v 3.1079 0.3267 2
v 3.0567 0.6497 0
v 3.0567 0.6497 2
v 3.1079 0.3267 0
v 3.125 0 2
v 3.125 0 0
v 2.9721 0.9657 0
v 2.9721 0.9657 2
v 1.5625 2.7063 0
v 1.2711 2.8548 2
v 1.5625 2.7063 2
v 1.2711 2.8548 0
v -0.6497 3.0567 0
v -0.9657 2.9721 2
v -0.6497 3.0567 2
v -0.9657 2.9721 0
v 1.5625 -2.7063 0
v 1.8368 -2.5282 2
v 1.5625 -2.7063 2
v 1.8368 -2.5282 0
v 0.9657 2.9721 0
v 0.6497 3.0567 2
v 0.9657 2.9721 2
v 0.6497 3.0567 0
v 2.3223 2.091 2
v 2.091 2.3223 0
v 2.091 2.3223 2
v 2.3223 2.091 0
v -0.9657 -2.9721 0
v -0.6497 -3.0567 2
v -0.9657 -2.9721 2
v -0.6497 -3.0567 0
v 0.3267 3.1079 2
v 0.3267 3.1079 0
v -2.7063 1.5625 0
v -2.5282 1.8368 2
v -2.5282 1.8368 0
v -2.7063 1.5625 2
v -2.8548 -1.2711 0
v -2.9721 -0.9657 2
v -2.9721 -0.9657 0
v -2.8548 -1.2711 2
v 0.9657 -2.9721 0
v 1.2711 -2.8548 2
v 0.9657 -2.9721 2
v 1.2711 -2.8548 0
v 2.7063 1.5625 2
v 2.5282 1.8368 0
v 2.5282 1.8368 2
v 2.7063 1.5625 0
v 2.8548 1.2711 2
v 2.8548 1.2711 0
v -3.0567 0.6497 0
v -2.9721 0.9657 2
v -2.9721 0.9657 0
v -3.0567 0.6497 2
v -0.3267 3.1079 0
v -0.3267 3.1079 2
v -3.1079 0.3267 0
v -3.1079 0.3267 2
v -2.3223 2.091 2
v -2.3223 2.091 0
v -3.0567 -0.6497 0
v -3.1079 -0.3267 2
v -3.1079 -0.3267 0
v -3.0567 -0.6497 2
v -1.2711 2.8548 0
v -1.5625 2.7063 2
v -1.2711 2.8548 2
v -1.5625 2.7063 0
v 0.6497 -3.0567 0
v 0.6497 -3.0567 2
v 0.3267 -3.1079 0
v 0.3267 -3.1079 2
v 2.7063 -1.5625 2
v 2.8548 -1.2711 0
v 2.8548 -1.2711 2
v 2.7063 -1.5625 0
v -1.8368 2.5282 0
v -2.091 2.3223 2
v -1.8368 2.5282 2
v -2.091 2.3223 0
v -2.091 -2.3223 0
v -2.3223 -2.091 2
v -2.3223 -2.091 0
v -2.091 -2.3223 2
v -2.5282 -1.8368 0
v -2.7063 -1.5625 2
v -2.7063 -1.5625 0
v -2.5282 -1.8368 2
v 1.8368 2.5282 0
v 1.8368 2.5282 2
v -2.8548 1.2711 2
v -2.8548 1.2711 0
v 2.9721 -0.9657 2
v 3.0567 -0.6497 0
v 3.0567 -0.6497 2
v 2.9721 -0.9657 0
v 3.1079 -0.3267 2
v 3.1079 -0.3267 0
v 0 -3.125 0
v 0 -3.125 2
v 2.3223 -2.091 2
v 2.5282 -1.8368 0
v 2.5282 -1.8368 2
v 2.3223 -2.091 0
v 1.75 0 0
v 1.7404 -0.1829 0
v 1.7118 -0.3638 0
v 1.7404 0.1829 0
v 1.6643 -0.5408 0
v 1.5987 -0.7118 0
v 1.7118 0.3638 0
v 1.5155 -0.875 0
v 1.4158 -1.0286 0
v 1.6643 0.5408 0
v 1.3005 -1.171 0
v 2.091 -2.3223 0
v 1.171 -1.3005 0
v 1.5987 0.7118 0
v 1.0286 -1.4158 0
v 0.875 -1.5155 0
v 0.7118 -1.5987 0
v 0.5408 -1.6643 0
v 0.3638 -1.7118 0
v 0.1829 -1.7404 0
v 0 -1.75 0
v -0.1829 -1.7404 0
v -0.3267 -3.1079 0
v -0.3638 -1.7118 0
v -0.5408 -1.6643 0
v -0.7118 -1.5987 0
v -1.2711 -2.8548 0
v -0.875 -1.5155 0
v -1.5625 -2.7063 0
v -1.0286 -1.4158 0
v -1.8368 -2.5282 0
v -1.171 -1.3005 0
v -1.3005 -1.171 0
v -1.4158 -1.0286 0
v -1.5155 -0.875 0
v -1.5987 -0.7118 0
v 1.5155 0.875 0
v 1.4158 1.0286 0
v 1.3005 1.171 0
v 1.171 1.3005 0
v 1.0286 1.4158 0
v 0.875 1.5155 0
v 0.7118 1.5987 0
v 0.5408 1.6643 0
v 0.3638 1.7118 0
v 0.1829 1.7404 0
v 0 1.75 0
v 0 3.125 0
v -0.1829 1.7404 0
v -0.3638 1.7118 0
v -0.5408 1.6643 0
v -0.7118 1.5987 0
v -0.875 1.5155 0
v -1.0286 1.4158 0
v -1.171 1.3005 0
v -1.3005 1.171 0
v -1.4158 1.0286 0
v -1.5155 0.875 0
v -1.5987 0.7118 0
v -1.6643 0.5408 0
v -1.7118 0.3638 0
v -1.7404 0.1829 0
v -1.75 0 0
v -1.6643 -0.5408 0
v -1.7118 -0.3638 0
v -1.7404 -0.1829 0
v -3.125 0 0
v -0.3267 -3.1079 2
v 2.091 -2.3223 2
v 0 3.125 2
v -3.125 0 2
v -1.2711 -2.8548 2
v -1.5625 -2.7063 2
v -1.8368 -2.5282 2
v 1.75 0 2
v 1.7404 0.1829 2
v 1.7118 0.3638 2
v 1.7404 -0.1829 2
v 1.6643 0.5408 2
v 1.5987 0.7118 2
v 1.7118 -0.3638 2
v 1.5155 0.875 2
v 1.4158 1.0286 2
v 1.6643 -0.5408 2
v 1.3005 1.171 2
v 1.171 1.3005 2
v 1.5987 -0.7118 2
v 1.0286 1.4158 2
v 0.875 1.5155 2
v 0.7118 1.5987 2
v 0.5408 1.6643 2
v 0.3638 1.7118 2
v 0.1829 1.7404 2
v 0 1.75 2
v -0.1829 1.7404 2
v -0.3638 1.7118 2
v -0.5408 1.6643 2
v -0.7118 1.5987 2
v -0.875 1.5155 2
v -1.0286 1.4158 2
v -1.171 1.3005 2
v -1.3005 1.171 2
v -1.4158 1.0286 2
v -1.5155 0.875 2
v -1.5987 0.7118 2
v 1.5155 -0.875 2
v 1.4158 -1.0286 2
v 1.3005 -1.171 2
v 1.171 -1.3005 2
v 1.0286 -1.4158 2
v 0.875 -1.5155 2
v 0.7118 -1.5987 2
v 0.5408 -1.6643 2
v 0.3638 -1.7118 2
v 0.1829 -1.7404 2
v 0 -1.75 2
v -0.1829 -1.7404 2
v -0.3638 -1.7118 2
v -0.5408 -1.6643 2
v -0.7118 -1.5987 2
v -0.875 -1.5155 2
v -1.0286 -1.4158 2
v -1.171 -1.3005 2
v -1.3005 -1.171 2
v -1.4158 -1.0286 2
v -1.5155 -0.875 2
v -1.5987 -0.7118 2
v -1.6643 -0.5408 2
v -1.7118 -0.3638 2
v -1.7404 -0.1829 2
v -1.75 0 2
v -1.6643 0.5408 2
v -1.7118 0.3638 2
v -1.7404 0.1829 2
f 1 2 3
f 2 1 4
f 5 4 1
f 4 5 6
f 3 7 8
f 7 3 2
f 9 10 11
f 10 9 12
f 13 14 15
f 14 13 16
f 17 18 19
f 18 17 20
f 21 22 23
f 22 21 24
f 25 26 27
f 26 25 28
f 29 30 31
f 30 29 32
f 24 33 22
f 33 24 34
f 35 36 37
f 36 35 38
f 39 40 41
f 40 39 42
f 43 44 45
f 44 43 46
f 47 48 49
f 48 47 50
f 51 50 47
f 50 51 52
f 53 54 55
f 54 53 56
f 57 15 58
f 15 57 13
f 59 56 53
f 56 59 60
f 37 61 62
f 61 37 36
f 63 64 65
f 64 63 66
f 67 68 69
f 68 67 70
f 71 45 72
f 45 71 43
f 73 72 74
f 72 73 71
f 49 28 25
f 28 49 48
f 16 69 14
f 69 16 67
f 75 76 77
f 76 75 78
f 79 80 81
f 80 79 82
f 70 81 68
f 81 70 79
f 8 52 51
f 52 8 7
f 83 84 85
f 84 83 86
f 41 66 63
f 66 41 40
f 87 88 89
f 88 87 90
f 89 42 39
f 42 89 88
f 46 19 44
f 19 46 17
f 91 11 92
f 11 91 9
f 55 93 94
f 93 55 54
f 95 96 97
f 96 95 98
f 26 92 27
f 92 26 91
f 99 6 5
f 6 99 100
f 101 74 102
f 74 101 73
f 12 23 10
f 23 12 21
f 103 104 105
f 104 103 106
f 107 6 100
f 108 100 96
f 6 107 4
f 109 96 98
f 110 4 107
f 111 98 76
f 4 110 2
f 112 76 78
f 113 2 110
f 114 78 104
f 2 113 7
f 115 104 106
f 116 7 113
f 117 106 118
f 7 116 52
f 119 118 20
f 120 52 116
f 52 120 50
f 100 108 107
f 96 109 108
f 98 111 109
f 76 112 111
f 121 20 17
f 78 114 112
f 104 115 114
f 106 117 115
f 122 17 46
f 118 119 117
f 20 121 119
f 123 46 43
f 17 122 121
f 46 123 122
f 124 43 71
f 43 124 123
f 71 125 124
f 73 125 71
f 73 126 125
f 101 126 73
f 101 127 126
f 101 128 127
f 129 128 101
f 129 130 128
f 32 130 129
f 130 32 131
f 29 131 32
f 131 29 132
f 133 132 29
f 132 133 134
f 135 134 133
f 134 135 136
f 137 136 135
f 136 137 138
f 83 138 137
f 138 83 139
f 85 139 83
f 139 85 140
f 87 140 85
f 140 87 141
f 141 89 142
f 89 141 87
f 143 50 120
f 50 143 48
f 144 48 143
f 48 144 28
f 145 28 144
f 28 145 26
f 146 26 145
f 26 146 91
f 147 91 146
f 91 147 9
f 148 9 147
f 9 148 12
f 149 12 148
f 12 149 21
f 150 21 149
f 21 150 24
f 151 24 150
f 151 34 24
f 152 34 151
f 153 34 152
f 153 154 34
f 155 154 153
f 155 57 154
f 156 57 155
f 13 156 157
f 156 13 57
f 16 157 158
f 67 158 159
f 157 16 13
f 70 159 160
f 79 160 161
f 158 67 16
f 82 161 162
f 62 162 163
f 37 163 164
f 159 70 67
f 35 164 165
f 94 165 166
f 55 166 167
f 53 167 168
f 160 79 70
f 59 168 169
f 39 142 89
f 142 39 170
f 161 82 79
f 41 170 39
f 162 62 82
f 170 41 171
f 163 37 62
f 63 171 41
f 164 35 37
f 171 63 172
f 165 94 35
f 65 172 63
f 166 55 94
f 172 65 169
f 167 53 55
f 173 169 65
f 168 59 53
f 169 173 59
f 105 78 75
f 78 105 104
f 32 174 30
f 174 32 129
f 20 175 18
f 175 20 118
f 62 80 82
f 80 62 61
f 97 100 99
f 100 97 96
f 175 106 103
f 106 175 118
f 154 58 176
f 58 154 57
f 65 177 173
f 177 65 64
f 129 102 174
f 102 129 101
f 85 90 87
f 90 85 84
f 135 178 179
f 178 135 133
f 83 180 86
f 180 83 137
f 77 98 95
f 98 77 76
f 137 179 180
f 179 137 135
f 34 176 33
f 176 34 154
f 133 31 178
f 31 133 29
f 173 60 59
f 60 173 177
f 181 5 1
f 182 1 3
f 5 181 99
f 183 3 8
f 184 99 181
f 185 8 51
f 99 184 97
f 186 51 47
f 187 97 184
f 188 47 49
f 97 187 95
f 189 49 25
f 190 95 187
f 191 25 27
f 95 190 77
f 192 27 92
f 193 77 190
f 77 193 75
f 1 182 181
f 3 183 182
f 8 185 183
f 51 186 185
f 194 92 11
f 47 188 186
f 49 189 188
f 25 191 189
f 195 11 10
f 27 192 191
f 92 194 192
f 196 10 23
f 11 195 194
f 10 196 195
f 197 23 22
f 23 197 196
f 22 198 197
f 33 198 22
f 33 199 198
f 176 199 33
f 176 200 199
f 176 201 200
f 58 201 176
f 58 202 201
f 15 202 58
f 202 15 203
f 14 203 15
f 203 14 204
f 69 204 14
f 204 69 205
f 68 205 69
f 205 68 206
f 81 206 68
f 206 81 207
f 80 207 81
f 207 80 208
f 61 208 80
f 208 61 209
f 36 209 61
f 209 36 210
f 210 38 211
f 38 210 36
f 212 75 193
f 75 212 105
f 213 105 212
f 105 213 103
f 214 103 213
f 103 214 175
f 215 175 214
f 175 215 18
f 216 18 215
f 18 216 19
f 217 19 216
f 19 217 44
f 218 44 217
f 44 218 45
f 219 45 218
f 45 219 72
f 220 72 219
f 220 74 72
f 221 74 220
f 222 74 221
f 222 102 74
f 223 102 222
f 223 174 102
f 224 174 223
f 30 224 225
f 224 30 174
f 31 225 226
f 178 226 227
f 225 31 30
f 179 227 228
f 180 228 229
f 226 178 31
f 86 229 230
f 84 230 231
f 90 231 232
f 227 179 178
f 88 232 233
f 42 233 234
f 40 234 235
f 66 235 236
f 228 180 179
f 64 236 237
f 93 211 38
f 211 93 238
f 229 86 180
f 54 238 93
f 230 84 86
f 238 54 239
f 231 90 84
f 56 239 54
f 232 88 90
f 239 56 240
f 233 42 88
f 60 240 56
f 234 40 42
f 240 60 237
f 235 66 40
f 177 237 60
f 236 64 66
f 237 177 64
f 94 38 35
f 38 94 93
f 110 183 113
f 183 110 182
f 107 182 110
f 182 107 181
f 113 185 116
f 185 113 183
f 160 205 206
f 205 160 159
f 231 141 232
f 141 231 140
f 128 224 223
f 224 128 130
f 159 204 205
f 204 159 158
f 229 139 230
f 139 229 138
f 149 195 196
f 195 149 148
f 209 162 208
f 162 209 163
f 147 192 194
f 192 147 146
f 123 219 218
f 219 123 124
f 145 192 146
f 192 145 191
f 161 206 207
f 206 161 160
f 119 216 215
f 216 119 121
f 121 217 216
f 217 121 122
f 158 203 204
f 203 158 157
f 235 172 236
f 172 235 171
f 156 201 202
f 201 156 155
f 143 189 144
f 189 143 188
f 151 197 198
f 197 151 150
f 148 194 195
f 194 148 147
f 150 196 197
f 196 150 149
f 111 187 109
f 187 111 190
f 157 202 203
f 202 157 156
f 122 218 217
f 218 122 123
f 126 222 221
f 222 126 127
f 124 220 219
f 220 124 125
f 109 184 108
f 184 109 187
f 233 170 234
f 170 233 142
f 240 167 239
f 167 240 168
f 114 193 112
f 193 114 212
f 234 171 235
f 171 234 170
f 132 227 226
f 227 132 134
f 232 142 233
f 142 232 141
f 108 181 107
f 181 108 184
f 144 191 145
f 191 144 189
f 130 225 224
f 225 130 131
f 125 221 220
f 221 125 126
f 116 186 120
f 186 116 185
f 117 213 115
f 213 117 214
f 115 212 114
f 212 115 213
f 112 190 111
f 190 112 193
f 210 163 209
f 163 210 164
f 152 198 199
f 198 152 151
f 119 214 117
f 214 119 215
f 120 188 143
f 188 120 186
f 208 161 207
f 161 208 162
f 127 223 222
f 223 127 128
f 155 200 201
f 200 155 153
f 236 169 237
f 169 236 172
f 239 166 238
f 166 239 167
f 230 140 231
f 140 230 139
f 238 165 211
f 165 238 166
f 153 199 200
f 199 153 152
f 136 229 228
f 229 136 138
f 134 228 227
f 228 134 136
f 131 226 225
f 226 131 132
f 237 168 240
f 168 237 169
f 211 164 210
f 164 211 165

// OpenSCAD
thick = 2;
innerdia=3.5;
outerdia=6.25;
res=60;

difference(){
    cylinder(thick, d=outerdia, $fn=res);
    cylinder(thick, d=innerdia, $fn=res);
}
